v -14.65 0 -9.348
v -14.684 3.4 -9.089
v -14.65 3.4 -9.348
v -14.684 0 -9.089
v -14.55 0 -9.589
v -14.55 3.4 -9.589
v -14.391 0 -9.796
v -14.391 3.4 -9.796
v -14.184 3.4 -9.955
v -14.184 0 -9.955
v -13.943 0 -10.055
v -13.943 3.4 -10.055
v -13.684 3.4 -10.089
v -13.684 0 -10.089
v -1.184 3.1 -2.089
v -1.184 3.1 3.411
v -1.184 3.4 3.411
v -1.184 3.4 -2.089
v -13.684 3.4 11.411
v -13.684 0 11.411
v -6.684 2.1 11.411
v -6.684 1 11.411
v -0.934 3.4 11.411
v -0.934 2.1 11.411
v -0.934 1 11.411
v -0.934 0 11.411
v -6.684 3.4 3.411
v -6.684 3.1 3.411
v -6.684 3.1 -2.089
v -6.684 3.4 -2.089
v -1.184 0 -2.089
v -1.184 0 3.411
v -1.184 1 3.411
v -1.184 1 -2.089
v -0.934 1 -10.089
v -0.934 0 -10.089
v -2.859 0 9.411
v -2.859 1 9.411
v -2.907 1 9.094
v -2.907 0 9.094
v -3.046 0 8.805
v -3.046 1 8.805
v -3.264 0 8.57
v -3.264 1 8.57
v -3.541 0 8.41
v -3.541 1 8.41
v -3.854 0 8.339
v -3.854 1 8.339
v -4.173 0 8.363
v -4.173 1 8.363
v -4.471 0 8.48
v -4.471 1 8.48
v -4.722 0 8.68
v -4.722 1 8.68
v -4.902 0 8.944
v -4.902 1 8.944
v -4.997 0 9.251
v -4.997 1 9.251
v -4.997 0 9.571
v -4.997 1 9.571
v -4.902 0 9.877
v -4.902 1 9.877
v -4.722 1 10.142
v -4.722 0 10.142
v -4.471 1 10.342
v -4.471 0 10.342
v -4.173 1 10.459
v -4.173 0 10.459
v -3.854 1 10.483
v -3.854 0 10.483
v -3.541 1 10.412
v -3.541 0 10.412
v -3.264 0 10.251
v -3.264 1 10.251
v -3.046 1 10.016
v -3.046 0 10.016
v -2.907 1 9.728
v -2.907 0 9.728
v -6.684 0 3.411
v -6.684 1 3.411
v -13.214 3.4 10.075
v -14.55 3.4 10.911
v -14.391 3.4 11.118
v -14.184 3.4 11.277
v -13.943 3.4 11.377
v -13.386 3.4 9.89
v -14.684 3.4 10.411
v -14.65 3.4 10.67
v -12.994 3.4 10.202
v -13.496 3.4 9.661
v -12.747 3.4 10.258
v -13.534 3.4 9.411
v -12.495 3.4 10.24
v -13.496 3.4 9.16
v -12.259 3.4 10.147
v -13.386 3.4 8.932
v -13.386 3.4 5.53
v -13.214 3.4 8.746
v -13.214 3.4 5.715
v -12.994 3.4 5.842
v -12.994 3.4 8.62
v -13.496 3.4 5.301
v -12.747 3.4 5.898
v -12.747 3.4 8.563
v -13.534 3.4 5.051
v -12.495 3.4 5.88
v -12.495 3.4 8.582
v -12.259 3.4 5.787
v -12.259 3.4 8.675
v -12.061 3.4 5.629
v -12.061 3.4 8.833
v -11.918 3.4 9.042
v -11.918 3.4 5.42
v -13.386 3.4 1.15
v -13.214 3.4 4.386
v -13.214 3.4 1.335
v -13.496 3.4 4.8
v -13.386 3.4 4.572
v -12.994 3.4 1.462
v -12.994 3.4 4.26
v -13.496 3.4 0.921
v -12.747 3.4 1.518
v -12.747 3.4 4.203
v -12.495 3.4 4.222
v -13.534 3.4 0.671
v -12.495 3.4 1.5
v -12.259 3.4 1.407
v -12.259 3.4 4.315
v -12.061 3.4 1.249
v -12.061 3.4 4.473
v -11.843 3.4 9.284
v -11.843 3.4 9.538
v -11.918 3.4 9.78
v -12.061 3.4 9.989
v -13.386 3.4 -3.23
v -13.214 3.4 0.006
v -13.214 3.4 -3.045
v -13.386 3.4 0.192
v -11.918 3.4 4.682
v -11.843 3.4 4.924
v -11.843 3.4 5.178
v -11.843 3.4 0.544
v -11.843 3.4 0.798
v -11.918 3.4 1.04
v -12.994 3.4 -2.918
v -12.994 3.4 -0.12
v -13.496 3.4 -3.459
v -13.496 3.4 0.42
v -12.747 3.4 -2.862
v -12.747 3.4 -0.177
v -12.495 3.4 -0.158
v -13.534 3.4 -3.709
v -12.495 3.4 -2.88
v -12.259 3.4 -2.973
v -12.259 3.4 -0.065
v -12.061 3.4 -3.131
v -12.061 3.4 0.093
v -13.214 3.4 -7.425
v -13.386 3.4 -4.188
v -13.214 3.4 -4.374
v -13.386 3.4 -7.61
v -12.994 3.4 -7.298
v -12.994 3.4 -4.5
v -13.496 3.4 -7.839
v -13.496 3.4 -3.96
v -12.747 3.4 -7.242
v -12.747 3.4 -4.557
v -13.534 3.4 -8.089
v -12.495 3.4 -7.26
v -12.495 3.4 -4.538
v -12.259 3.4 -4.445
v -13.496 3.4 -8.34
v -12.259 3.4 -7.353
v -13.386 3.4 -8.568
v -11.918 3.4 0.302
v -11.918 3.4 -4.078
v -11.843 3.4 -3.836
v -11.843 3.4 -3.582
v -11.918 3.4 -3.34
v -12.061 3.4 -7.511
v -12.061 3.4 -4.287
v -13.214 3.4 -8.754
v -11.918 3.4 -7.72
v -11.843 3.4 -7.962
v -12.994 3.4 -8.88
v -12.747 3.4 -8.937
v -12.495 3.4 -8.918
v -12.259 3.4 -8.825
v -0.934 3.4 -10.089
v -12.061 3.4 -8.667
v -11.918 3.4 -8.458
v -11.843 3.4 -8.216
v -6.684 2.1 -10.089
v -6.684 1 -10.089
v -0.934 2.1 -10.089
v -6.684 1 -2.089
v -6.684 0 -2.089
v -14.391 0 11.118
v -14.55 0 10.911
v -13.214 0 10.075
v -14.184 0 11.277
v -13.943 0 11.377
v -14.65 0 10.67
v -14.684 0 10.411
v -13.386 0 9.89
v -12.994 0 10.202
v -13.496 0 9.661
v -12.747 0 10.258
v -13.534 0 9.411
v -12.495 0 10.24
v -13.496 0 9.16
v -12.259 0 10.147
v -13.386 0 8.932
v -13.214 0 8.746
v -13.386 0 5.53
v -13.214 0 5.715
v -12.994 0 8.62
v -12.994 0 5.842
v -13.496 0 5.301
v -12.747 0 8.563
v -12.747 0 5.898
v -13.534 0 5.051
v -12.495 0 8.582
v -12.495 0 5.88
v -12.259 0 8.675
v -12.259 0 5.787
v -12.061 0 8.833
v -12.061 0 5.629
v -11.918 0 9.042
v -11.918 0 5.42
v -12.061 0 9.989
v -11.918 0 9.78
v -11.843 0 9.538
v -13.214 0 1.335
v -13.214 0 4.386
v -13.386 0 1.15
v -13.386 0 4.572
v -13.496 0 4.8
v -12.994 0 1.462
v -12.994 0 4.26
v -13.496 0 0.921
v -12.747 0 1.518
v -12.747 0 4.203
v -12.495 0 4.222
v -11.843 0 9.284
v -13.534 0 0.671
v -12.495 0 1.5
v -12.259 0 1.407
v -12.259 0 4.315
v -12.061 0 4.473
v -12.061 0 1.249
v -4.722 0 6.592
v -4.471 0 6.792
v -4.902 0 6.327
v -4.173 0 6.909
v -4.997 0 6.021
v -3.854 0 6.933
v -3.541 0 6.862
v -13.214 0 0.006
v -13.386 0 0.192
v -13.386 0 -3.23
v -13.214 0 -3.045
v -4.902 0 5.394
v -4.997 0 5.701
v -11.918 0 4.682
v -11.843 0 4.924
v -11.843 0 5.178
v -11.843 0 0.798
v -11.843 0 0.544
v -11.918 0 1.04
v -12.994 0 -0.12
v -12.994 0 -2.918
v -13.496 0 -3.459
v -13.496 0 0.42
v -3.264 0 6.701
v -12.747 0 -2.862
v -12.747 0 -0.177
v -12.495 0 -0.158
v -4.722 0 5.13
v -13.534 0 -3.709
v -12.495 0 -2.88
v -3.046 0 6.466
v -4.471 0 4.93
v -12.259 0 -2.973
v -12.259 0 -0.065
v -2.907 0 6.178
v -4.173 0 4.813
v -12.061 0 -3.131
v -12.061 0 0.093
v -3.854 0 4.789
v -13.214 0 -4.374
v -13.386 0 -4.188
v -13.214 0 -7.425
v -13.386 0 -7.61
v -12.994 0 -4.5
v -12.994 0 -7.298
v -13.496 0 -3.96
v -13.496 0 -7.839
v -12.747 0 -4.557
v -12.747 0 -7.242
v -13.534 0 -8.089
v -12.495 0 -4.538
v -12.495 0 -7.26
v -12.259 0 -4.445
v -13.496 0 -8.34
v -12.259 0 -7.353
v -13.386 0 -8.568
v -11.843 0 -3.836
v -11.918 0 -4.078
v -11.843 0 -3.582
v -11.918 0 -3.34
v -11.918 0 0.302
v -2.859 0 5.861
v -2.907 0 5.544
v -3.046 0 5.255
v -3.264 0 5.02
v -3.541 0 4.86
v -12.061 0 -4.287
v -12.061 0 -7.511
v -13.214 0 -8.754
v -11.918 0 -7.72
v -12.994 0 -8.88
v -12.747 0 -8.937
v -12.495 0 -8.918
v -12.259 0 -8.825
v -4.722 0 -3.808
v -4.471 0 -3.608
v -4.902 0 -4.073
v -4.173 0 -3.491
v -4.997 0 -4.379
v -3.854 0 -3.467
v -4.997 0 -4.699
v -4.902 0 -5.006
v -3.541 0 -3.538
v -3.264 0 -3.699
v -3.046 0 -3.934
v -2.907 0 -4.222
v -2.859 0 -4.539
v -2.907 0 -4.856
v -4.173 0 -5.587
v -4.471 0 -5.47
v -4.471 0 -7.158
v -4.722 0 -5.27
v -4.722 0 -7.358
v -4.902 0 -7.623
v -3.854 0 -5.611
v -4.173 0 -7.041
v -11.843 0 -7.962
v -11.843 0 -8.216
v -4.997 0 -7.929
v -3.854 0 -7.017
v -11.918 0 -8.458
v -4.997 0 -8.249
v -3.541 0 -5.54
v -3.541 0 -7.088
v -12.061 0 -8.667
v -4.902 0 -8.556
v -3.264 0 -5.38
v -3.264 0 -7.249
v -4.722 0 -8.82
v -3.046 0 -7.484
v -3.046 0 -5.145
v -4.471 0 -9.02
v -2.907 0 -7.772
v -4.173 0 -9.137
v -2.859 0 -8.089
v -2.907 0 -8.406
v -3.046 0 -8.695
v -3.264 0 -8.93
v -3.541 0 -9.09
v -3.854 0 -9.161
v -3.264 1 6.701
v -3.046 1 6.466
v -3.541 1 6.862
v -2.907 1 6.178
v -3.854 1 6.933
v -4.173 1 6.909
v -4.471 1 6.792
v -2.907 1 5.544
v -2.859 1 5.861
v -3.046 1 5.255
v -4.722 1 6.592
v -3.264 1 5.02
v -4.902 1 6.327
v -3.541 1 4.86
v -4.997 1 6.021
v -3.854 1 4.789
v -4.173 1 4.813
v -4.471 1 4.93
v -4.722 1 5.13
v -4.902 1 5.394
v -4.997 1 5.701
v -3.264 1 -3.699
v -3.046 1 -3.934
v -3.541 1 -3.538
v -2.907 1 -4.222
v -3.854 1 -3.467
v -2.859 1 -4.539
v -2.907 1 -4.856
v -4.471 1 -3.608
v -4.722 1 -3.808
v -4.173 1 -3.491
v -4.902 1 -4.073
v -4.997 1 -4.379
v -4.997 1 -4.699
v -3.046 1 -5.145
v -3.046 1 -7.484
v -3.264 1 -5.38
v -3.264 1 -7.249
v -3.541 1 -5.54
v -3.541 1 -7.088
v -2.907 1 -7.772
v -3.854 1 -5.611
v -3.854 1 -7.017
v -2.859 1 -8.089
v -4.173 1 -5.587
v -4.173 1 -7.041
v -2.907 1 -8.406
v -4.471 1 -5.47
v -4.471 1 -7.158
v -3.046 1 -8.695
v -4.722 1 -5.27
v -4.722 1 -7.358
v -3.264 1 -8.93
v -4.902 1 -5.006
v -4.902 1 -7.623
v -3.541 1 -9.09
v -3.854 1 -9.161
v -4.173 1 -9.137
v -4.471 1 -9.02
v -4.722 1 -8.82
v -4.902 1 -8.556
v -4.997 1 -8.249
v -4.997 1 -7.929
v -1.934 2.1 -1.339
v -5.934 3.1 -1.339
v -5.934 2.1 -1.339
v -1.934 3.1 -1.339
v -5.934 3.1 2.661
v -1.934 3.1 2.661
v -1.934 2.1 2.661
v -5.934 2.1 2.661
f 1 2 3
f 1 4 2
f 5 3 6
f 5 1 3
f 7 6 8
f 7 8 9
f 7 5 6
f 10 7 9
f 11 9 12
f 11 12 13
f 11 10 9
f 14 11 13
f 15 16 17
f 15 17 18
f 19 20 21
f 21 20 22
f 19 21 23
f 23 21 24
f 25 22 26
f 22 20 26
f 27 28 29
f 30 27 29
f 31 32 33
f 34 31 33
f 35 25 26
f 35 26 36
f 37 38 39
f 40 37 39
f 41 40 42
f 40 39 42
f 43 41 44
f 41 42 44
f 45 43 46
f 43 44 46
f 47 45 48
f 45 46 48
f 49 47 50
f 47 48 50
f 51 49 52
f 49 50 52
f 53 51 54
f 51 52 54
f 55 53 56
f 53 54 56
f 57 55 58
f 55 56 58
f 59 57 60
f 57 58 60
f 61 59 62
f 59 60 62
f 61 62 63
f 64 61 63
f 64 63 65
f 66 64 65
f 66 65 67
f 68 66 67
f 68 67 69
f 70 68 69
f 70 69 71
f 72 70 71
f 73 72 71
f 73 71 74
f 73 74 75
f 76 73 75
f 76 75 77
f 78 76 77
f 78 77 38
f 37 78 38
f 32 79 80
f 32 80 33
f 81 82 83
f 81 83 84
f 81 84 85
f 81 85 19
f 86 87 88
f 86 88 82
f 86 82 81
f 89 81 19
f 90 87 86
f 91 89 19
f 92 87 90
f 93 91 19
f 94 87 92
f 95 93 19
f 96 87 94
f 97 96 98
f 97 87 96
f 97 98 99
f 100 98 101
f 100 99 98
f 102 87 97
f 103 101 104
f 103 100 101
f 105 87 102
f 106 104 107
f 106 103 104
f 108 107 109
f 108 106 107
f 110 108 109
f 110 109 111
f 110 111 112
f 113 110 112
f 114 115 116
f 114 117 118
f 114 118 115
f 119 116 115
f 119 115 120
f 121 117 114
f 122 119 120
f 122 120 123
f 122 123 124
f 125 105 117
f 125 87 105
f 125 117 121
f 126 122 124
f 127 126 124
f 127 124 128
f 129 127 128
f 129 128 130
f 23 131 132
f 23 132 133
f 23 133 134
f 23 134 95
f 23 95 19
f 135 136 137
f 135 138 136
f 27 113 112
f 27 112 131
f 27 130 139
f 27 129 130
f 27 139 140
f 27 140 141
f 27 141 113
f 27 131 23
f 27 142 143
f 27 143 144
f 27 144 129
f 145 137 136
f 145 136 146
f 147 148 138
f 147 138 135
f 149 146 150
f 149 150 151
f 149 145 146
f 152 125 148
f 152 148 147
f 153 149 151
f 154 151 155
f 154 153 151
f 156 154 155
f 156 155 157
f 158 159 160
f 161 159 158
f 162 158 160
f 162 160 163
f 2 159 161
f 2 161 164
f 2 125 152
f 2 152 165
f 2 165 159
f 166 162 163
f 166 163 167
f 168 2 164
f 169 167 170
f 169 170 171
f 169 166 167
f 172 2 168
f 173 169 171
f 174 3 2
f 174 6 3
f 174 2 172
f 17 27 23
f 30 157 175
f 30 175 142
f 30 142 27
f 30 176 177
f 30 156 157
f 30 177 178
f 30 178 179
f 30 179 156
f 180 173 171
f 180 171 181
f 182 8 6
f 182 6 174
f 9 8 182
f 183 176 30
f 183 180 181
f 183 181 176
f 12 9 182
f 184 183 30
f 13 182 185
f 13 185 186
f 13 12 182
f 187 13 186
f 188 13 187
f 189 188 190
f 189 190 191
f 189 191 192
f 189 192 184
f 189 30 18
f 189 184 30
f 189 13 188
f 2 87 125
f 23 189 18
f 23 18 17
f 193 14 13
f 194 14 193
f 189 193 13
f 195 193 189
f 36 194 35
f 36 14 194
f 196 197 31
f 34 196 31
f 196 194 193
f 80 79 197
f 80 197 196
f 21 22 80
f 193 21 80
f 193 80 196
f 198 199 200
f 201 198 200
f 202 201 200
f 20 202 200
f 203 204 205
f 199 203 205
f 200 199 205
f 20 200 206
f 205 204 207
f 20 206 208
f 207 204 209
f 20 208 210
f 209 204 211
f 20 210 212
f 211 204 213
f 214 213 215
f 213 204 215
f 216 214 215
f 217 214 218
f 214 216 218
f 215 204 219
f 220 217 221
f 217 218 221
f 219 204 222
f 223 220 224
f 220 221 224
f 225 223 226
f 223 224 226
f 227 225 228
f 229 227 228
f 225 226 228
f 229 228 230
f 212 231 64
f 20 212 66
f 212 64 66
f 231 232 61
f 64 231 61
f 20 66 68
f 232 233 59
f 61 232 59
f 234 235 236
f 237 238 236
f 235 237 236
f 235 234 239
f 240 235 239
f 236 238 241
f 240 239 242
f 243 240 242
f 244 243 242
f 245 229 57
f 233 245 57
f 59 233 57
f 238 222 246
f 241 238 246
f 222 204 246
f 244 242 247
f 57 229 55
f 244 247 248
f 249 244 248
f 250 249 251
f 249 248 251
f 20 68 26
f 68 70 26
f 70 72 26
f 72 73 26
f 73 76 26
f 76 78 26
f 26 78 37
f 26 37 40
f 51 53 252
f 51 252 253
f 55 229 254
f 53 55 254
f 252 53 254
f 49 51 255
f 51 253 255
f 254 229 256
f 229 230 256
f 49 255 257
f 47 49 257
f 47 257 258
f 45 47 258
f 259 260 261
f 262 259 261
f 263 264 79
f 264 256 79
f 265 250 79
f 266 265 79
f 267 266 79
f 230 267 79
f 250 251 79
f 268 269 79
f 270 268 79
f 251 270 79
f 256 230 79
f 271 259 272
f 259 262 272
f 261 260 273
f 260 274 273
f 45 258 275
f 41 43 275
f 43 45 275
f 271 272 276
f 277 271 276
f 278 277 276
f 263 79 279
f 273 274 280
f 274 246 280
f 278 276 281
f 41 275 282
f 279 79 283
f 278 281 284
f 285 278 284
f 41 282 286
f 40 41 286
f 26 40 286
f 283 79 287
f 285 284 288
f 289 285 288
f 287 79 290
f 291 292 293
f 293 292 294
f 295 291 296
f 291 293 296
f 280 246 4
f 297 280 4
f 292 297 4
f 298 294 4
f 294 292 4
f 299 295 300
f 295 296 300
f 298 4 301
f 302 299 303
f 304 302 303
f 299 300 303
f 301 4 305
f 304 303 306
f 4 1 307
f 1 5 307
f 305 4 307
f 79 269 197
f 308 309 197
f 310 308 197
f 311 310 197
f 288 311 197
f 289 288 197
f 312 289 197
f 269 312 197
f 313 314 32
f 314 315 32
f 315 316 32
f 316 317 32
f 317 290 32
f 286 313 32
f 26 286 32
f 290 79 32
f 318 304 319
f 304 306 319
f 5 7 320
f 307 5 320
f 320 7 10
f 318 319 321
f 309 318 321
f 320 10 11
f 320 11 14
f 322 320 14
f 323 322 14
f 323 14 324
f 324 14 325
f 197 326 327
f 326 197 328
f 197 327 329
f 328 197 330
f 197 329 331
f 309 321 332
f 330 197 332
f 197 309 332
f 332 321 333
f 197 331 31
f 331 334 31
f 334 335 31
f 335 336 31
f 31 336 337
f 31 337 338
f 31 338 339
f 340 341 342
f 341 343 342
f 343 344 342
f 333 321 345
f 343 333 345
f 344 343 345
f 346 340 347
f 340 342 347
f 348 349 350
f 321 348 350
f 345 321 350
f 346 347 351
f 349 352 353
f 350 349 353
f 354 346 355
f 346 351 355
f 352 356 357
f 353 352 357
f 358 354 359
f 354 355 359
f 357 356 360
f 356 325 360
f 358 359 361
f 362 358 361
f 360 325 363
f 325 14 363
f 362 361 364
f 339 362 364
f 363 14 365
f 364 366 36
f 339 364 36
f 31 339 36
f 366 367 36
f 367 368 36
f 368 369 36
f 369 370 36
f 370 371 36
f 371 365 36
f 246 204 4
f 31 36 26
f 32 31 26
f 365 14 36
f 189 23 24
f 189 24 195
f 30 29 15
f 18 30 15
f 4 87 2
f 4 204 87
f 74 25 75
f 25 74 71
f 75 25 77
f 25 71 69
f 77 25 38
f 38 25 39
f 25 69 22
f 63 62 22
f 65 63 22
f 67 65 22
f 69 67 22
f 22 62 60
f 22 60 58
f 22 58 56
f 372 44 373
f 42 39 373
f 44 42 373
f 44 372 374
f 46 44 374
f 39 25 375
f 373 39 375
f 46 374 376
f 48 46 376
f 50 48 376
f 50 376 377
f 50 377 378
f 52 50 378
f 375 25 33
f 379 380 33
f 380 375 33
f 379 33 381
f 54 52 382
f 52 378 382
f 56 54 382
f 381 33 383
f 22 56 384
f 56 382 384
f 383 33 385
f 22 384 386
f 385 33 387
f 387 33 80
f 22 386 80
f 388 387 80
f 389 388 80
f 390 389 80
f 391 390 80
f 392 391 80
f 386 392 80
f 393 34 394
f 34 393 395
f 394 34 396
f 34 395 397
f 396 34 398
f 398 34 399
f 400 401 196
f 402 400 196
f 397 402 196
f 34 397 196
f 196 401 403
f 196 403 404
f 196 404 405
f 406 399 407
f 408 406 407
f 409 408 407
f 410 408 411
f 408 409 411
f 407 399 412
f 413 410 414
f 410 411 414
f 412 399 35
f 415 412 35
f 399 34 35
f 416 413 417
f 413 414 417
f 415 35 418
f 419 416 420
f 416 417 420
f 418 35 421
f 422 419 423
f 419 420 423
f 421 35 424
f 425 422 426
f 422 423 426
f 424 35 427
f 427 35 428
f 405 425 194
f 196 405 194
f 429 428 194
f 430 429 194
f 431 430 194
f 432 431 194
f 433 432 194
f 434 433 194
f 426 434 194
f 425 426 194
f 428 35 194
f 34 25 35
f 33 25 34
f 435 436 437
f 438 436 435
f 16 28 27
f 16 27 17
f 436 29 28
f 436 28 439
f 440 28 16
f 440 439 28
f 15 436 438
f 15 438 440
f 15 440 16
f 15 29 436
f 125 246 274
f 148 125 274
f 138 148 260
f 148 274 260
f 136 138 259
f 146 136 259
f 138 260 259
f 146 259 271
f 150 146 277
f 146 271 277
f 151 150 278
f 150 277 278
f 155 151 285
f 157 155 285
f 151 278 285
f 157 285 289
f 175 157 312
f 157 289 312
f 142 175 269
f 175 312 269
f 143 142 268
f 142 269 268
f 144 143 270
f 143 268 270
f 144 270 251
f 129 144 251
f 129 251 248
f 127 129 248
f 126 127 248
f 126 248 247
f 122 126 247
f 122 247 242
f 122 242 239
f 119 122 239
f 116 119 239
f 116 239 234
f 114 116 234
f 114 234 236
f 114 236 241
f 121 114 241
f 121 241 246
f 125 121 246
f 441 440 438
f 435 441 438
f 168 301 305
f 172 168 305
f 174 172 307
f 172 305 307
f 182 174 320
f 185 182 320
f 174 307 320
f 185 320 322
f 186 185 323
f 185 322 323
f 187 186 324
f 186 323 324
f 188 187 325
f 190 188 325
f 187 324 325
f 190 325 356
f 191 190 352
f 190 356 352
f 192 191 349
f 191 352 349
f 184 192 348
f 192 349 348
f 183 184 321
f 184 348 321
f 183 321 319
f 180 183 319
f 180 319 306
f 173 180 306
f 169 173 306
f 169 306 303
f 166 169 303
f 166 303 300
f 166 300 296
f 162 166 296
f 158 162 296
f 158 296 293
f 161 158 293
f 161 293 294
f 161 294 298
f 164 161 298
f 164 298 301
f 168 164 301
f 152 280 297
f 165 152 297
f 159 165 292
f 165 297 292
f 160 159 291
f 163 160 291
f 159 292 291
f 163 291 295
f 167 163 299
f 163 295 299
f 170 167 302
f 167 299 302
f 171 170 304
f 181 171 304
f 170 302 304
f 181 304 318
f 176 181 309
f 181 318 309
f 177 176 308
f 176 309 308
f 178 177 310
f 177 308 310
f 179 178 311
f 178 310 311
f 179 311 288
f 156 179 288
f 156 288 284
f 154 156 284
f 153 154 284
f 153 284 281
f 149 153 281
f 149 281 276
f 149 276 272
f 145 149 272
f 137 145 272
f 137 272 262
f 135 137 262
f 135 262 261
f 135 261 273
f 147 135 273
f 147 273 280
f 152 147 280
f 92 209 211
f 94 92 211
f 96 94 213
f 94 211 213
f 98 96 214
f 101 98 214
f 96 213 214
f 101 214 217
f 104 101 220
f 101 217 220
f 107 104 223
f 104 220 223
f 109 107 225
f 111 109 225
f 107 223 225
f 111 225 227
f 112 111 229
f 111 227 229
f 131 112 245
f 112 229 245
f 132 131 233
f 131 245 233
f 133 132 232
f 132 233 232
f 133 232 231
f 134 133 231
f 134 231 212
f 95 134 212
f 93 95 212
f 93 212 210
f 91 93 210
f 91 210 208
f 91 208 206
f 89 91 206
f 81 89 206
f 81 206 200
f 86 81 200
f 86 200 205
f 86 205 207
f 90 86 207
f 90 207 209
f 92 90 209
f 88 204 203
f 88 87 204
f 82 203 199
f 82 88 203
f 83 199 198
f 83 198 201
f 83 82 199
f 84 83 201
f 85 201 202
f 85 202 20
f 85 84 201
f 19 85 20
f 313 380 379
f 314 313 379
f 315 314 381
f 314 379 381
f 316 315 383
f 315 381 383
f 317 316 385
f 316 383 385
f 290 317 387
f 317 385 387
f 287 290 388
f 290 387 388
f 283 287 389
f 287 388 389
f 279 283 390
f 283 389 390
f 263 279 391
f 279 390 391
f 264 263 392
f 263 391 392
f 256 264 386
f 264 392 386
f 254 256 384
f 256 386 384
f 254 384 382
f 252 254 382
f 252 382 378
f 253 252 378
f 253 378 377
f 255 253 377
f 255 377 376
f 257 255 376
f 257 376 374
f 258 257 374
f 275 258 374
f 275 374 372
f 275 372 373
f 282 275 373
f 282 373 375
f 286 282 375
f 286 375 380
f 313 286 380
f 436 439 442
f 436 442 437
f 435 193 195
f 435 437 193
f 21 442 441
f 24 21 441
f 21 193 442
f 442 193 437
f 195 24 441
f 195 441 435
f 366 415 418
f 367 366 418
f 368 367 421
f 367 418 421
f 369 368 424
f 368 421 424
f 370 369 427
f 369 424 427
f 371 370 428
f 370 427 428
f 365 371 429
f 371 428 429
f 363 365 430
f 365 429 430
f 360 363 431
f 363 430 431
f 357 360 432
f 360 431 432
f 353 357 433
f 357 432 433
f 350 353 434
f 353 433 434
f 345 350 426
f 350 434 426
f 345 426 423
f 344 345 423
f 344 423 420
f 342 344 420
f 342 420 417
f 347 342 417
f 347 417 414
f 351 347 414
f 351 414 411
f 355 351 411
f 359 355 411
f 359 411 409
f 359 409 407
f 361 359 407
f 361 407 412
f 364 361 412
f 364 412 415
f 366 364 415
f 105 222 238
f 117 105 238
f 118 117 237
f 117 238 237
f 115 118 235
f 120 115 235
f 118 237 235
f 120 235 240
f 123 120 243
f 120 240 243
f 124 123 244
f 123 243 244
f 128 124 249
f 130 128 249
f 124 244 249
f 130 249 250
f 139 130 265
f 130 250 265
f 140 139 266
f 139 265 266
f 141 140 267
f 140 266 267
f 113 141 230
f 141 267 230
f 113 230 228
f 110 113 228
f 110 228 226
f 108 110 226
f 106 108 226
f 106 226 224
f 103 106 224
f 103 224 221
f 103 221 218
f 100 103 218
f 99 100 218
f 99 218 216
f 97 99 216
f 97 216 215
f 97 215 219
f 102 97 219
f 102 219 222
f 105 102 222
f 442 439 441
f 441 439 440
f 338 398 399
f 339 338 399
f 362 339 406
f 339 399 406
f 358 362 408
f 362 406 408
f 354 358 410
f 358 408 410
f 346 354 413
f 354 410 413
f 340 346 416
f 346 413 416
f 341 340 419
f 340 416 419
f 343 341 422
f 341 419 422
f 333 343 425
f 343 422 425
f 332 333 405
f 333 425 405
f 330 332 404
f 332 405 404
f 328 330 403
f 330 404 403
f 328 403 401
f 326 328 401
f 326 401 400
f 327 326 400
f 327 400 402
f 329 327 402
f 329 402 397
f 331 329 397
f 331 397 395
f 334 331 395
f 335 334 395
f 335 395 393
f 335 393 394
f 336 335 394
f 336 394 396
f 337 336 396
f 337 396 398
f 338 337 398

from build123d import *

# Parameters (mm, degrees)
SKETCH1_W                          = 21.5
SKETCH1_H                          = 21.5
BOSS_EXTRUDE1_DEPTH                = 3.1
SKETCH2_W                          = 5.5
SKETCH2_H                          = 1.1
CUT_EXTRUDE1_DEPTH                 = 27.219811656
SKETCH3_W                          = 21.5
SKETCH3_H                          = 21.5
SKETCH3_W_2                        = 5.5
SKETCH3_H_2                        = 5.5
BOSS_EXTRUDE2_DEPTH                = 0.3
SKETCH11_W                         = 4
SKETCH11_H                         = 4
CUT_EXTRUDE2_DEPTH                 = 19.85301637
TAP_DRILL_FOR_M2X0_4_TAP3_D        = 1.7
TAP_DRILL_FOR_M2_5X0_45_TAP1_D     = 2.15
TAP_DRILL_FOR_M2_5X0_45_TAP1_DEPTH = 1
CUT_EXTRUDE3_REACH                 = 20.905
SKETCH18_W                         = 5.5
SKETCH18_H                         = 5.5
FILLET3_R                          = 1
SKETCH21_W                         = 13.124555245
SKETCH21_H                         = 35.298127434
CUT_EXTRUDE8_DEPTH                 = 19.904661496
SKETCH22_W                         = 0.25
SKETCH22_H                         = 1.1
CUT_EXTRUDE9_DEPTH                 = 27.256970946


with BuildPart() as part:
    # Sketch1 → Boss-Extrude1 (new body)
    with BuildSketch(Plane(origin=(0, 0, 0), x_dir=(1, 0, 0), z_dir=(0, 1, 0))):
        with Locations((-3.933954619, -0.660858995)):
            Rectangle(SKETCH1_W, SKETCH1_H)
    extrude(amount=BOSS_EXTRUDE1_DEPTH)

    # Sketch2 → Cut-Extrude1 (cut, through all)
    with BuildSketch(Plane.XY.offset(11.410858995)):
        with Locations((-3.933954619, 1.55)):
            Rectangle(SKETCH2_W, SKETCH2_H)
    extrude(amount=-CUT_EXTRUDE1_DEPTH, mode=Mode.SUBTRACT)

    # Sketch3 → Boss-Extrude2 (add)
    with BuildSketch(Plane(origin=(0, 3.1, 0), x_dir=(1, 0, 0), z_dir=(0, 1, 0))):
        with Locations((-3.933954619, -0.660858995)):
            Rectangle(SKETCH3_W, SKETCH3_H)
        with Locations((-3.933954619, -0.660858995)):
            Rectangle(SKETCH3_W_2, SKETCH3_H_2, mode=Mode.SUBTRACT)
    extrude(amount=BOSS_EXTRUDE2_DEPTH)

    # Sketch11 → Cut-Extrude2 (cut, through all)
    with BuildSketch(Plane(origin=(0, 3.1, 0), x_dir=(1, 0, 0), z_dir=(0, 1, 0))):
        with Locations((-3.933954619, -0.660858995)):
            Rectangle(SKETCH11_W, SKETCH11_H)
    extrude(amount=-CUT_EXTRUDE2_DEPTH, mode=Mode.SUBTRACT)

    # Tap Drill for M2x0.4 Tap3 (through all)
    with Locations(Plane(origin=(0, 3.4, 0), x_dir=(1, 0, 0), z_dir=(0, 1, 0))):
        with Locations((-12.683954619, 8.089141005), (4.816045381, 8.089141005), (4.816045381, -9.410858995), (-12.683954619, -9.410858995), (-12.683954619, 3.709141005), (-12.683954619, -0.670858995), (-12.683954619, -5.050858995)):
            Hole(TAP_DRILL_FOR_M2X0_4_TAP3_D / 2)

    # Tap Drill for M2.5x0.45 Tap1
    with Locations(Plane(origin=(0, 0, 0), x_dir=(-1, 0, 0), z_dir=(0, -1, 0))):
        with Locations((3.933954619, 8.089141005), (3.933954619, -9.410858995), (3.933954619, 4.539141005), (3.933954619, -5.860858995)):
            Hole(TAP_DRILL_FOR_M2_5X0_45_TAP1_D / 2, depth=TAP_DRILL_FOR_M2_5X0_45_TAP1_DEPTH)

    # Sketch18 → Cut-Extrude3 (cut, up to next)
    with BuildSketch(Plane.XZ, mode=Mode.PRIVATE) as cut_extrude3_sk1:
        with Locations((-3.933954619, 0.660858995)):
            Rectangle(SKETCH18_W, SKETCH18_H)
    cut_extrude3_tool1 = extrude(cut_extrude3_sk1.sketch, amount=-CUT_EXTRUDE3_REACH, mode=Mode.PRIVATE) & part.part
    add(cut_extrude3_tool1.solids().sort_by_distance((-3.933955, 0, 0.660859))[0], mode=Mode.SUBTRACT)

    # Fillet3
    fillet3_edges = [part.edges().sort_by_distance(p)[0] for p in [
        (-14.683954619, 1.7, -10.089141005),
        (6.816045381, 1.7, -10.089141005),
        (6.816045381, 1.7, 11.410858995),
        (-14.683954619, 1.7, 11.410858995),
    ]]
    fillet(fillet3_edges, radius=FILLET3_R)

    # Sketch21 → Cut-Extrude8 (cut, through all)
    with BuildSketch(Plane(origin=(0, 3.4, 0), x_dir=(1, 0, 0), z_dir=(0, 1, 0))):
        with Locations((5.628323004, -1.911462044)):
            Rectangle(SKETCH21_W, SKETCH21_H)
    extrude(amount=-CUT_EXTRUDE8_DEPTH, mode=Mode.SUBTRACT)

    # Sketch22 → Cut-Extrude9 (cut, through all)
    with BuildSketch(Plane(origin=(0, 0, -10.089141005), x_dir=(-1, 0, 0), z_dir=(0, 0, -1))):
        with Locations((1.058954619, 1.55)):
            Rectangle(SKETCH22_W, SKETCH22_H)
    extrude(amount=-CUT_EXTRUDE9_DEPTH, mode=Mode.SUBTRACT)


solid = part.part
